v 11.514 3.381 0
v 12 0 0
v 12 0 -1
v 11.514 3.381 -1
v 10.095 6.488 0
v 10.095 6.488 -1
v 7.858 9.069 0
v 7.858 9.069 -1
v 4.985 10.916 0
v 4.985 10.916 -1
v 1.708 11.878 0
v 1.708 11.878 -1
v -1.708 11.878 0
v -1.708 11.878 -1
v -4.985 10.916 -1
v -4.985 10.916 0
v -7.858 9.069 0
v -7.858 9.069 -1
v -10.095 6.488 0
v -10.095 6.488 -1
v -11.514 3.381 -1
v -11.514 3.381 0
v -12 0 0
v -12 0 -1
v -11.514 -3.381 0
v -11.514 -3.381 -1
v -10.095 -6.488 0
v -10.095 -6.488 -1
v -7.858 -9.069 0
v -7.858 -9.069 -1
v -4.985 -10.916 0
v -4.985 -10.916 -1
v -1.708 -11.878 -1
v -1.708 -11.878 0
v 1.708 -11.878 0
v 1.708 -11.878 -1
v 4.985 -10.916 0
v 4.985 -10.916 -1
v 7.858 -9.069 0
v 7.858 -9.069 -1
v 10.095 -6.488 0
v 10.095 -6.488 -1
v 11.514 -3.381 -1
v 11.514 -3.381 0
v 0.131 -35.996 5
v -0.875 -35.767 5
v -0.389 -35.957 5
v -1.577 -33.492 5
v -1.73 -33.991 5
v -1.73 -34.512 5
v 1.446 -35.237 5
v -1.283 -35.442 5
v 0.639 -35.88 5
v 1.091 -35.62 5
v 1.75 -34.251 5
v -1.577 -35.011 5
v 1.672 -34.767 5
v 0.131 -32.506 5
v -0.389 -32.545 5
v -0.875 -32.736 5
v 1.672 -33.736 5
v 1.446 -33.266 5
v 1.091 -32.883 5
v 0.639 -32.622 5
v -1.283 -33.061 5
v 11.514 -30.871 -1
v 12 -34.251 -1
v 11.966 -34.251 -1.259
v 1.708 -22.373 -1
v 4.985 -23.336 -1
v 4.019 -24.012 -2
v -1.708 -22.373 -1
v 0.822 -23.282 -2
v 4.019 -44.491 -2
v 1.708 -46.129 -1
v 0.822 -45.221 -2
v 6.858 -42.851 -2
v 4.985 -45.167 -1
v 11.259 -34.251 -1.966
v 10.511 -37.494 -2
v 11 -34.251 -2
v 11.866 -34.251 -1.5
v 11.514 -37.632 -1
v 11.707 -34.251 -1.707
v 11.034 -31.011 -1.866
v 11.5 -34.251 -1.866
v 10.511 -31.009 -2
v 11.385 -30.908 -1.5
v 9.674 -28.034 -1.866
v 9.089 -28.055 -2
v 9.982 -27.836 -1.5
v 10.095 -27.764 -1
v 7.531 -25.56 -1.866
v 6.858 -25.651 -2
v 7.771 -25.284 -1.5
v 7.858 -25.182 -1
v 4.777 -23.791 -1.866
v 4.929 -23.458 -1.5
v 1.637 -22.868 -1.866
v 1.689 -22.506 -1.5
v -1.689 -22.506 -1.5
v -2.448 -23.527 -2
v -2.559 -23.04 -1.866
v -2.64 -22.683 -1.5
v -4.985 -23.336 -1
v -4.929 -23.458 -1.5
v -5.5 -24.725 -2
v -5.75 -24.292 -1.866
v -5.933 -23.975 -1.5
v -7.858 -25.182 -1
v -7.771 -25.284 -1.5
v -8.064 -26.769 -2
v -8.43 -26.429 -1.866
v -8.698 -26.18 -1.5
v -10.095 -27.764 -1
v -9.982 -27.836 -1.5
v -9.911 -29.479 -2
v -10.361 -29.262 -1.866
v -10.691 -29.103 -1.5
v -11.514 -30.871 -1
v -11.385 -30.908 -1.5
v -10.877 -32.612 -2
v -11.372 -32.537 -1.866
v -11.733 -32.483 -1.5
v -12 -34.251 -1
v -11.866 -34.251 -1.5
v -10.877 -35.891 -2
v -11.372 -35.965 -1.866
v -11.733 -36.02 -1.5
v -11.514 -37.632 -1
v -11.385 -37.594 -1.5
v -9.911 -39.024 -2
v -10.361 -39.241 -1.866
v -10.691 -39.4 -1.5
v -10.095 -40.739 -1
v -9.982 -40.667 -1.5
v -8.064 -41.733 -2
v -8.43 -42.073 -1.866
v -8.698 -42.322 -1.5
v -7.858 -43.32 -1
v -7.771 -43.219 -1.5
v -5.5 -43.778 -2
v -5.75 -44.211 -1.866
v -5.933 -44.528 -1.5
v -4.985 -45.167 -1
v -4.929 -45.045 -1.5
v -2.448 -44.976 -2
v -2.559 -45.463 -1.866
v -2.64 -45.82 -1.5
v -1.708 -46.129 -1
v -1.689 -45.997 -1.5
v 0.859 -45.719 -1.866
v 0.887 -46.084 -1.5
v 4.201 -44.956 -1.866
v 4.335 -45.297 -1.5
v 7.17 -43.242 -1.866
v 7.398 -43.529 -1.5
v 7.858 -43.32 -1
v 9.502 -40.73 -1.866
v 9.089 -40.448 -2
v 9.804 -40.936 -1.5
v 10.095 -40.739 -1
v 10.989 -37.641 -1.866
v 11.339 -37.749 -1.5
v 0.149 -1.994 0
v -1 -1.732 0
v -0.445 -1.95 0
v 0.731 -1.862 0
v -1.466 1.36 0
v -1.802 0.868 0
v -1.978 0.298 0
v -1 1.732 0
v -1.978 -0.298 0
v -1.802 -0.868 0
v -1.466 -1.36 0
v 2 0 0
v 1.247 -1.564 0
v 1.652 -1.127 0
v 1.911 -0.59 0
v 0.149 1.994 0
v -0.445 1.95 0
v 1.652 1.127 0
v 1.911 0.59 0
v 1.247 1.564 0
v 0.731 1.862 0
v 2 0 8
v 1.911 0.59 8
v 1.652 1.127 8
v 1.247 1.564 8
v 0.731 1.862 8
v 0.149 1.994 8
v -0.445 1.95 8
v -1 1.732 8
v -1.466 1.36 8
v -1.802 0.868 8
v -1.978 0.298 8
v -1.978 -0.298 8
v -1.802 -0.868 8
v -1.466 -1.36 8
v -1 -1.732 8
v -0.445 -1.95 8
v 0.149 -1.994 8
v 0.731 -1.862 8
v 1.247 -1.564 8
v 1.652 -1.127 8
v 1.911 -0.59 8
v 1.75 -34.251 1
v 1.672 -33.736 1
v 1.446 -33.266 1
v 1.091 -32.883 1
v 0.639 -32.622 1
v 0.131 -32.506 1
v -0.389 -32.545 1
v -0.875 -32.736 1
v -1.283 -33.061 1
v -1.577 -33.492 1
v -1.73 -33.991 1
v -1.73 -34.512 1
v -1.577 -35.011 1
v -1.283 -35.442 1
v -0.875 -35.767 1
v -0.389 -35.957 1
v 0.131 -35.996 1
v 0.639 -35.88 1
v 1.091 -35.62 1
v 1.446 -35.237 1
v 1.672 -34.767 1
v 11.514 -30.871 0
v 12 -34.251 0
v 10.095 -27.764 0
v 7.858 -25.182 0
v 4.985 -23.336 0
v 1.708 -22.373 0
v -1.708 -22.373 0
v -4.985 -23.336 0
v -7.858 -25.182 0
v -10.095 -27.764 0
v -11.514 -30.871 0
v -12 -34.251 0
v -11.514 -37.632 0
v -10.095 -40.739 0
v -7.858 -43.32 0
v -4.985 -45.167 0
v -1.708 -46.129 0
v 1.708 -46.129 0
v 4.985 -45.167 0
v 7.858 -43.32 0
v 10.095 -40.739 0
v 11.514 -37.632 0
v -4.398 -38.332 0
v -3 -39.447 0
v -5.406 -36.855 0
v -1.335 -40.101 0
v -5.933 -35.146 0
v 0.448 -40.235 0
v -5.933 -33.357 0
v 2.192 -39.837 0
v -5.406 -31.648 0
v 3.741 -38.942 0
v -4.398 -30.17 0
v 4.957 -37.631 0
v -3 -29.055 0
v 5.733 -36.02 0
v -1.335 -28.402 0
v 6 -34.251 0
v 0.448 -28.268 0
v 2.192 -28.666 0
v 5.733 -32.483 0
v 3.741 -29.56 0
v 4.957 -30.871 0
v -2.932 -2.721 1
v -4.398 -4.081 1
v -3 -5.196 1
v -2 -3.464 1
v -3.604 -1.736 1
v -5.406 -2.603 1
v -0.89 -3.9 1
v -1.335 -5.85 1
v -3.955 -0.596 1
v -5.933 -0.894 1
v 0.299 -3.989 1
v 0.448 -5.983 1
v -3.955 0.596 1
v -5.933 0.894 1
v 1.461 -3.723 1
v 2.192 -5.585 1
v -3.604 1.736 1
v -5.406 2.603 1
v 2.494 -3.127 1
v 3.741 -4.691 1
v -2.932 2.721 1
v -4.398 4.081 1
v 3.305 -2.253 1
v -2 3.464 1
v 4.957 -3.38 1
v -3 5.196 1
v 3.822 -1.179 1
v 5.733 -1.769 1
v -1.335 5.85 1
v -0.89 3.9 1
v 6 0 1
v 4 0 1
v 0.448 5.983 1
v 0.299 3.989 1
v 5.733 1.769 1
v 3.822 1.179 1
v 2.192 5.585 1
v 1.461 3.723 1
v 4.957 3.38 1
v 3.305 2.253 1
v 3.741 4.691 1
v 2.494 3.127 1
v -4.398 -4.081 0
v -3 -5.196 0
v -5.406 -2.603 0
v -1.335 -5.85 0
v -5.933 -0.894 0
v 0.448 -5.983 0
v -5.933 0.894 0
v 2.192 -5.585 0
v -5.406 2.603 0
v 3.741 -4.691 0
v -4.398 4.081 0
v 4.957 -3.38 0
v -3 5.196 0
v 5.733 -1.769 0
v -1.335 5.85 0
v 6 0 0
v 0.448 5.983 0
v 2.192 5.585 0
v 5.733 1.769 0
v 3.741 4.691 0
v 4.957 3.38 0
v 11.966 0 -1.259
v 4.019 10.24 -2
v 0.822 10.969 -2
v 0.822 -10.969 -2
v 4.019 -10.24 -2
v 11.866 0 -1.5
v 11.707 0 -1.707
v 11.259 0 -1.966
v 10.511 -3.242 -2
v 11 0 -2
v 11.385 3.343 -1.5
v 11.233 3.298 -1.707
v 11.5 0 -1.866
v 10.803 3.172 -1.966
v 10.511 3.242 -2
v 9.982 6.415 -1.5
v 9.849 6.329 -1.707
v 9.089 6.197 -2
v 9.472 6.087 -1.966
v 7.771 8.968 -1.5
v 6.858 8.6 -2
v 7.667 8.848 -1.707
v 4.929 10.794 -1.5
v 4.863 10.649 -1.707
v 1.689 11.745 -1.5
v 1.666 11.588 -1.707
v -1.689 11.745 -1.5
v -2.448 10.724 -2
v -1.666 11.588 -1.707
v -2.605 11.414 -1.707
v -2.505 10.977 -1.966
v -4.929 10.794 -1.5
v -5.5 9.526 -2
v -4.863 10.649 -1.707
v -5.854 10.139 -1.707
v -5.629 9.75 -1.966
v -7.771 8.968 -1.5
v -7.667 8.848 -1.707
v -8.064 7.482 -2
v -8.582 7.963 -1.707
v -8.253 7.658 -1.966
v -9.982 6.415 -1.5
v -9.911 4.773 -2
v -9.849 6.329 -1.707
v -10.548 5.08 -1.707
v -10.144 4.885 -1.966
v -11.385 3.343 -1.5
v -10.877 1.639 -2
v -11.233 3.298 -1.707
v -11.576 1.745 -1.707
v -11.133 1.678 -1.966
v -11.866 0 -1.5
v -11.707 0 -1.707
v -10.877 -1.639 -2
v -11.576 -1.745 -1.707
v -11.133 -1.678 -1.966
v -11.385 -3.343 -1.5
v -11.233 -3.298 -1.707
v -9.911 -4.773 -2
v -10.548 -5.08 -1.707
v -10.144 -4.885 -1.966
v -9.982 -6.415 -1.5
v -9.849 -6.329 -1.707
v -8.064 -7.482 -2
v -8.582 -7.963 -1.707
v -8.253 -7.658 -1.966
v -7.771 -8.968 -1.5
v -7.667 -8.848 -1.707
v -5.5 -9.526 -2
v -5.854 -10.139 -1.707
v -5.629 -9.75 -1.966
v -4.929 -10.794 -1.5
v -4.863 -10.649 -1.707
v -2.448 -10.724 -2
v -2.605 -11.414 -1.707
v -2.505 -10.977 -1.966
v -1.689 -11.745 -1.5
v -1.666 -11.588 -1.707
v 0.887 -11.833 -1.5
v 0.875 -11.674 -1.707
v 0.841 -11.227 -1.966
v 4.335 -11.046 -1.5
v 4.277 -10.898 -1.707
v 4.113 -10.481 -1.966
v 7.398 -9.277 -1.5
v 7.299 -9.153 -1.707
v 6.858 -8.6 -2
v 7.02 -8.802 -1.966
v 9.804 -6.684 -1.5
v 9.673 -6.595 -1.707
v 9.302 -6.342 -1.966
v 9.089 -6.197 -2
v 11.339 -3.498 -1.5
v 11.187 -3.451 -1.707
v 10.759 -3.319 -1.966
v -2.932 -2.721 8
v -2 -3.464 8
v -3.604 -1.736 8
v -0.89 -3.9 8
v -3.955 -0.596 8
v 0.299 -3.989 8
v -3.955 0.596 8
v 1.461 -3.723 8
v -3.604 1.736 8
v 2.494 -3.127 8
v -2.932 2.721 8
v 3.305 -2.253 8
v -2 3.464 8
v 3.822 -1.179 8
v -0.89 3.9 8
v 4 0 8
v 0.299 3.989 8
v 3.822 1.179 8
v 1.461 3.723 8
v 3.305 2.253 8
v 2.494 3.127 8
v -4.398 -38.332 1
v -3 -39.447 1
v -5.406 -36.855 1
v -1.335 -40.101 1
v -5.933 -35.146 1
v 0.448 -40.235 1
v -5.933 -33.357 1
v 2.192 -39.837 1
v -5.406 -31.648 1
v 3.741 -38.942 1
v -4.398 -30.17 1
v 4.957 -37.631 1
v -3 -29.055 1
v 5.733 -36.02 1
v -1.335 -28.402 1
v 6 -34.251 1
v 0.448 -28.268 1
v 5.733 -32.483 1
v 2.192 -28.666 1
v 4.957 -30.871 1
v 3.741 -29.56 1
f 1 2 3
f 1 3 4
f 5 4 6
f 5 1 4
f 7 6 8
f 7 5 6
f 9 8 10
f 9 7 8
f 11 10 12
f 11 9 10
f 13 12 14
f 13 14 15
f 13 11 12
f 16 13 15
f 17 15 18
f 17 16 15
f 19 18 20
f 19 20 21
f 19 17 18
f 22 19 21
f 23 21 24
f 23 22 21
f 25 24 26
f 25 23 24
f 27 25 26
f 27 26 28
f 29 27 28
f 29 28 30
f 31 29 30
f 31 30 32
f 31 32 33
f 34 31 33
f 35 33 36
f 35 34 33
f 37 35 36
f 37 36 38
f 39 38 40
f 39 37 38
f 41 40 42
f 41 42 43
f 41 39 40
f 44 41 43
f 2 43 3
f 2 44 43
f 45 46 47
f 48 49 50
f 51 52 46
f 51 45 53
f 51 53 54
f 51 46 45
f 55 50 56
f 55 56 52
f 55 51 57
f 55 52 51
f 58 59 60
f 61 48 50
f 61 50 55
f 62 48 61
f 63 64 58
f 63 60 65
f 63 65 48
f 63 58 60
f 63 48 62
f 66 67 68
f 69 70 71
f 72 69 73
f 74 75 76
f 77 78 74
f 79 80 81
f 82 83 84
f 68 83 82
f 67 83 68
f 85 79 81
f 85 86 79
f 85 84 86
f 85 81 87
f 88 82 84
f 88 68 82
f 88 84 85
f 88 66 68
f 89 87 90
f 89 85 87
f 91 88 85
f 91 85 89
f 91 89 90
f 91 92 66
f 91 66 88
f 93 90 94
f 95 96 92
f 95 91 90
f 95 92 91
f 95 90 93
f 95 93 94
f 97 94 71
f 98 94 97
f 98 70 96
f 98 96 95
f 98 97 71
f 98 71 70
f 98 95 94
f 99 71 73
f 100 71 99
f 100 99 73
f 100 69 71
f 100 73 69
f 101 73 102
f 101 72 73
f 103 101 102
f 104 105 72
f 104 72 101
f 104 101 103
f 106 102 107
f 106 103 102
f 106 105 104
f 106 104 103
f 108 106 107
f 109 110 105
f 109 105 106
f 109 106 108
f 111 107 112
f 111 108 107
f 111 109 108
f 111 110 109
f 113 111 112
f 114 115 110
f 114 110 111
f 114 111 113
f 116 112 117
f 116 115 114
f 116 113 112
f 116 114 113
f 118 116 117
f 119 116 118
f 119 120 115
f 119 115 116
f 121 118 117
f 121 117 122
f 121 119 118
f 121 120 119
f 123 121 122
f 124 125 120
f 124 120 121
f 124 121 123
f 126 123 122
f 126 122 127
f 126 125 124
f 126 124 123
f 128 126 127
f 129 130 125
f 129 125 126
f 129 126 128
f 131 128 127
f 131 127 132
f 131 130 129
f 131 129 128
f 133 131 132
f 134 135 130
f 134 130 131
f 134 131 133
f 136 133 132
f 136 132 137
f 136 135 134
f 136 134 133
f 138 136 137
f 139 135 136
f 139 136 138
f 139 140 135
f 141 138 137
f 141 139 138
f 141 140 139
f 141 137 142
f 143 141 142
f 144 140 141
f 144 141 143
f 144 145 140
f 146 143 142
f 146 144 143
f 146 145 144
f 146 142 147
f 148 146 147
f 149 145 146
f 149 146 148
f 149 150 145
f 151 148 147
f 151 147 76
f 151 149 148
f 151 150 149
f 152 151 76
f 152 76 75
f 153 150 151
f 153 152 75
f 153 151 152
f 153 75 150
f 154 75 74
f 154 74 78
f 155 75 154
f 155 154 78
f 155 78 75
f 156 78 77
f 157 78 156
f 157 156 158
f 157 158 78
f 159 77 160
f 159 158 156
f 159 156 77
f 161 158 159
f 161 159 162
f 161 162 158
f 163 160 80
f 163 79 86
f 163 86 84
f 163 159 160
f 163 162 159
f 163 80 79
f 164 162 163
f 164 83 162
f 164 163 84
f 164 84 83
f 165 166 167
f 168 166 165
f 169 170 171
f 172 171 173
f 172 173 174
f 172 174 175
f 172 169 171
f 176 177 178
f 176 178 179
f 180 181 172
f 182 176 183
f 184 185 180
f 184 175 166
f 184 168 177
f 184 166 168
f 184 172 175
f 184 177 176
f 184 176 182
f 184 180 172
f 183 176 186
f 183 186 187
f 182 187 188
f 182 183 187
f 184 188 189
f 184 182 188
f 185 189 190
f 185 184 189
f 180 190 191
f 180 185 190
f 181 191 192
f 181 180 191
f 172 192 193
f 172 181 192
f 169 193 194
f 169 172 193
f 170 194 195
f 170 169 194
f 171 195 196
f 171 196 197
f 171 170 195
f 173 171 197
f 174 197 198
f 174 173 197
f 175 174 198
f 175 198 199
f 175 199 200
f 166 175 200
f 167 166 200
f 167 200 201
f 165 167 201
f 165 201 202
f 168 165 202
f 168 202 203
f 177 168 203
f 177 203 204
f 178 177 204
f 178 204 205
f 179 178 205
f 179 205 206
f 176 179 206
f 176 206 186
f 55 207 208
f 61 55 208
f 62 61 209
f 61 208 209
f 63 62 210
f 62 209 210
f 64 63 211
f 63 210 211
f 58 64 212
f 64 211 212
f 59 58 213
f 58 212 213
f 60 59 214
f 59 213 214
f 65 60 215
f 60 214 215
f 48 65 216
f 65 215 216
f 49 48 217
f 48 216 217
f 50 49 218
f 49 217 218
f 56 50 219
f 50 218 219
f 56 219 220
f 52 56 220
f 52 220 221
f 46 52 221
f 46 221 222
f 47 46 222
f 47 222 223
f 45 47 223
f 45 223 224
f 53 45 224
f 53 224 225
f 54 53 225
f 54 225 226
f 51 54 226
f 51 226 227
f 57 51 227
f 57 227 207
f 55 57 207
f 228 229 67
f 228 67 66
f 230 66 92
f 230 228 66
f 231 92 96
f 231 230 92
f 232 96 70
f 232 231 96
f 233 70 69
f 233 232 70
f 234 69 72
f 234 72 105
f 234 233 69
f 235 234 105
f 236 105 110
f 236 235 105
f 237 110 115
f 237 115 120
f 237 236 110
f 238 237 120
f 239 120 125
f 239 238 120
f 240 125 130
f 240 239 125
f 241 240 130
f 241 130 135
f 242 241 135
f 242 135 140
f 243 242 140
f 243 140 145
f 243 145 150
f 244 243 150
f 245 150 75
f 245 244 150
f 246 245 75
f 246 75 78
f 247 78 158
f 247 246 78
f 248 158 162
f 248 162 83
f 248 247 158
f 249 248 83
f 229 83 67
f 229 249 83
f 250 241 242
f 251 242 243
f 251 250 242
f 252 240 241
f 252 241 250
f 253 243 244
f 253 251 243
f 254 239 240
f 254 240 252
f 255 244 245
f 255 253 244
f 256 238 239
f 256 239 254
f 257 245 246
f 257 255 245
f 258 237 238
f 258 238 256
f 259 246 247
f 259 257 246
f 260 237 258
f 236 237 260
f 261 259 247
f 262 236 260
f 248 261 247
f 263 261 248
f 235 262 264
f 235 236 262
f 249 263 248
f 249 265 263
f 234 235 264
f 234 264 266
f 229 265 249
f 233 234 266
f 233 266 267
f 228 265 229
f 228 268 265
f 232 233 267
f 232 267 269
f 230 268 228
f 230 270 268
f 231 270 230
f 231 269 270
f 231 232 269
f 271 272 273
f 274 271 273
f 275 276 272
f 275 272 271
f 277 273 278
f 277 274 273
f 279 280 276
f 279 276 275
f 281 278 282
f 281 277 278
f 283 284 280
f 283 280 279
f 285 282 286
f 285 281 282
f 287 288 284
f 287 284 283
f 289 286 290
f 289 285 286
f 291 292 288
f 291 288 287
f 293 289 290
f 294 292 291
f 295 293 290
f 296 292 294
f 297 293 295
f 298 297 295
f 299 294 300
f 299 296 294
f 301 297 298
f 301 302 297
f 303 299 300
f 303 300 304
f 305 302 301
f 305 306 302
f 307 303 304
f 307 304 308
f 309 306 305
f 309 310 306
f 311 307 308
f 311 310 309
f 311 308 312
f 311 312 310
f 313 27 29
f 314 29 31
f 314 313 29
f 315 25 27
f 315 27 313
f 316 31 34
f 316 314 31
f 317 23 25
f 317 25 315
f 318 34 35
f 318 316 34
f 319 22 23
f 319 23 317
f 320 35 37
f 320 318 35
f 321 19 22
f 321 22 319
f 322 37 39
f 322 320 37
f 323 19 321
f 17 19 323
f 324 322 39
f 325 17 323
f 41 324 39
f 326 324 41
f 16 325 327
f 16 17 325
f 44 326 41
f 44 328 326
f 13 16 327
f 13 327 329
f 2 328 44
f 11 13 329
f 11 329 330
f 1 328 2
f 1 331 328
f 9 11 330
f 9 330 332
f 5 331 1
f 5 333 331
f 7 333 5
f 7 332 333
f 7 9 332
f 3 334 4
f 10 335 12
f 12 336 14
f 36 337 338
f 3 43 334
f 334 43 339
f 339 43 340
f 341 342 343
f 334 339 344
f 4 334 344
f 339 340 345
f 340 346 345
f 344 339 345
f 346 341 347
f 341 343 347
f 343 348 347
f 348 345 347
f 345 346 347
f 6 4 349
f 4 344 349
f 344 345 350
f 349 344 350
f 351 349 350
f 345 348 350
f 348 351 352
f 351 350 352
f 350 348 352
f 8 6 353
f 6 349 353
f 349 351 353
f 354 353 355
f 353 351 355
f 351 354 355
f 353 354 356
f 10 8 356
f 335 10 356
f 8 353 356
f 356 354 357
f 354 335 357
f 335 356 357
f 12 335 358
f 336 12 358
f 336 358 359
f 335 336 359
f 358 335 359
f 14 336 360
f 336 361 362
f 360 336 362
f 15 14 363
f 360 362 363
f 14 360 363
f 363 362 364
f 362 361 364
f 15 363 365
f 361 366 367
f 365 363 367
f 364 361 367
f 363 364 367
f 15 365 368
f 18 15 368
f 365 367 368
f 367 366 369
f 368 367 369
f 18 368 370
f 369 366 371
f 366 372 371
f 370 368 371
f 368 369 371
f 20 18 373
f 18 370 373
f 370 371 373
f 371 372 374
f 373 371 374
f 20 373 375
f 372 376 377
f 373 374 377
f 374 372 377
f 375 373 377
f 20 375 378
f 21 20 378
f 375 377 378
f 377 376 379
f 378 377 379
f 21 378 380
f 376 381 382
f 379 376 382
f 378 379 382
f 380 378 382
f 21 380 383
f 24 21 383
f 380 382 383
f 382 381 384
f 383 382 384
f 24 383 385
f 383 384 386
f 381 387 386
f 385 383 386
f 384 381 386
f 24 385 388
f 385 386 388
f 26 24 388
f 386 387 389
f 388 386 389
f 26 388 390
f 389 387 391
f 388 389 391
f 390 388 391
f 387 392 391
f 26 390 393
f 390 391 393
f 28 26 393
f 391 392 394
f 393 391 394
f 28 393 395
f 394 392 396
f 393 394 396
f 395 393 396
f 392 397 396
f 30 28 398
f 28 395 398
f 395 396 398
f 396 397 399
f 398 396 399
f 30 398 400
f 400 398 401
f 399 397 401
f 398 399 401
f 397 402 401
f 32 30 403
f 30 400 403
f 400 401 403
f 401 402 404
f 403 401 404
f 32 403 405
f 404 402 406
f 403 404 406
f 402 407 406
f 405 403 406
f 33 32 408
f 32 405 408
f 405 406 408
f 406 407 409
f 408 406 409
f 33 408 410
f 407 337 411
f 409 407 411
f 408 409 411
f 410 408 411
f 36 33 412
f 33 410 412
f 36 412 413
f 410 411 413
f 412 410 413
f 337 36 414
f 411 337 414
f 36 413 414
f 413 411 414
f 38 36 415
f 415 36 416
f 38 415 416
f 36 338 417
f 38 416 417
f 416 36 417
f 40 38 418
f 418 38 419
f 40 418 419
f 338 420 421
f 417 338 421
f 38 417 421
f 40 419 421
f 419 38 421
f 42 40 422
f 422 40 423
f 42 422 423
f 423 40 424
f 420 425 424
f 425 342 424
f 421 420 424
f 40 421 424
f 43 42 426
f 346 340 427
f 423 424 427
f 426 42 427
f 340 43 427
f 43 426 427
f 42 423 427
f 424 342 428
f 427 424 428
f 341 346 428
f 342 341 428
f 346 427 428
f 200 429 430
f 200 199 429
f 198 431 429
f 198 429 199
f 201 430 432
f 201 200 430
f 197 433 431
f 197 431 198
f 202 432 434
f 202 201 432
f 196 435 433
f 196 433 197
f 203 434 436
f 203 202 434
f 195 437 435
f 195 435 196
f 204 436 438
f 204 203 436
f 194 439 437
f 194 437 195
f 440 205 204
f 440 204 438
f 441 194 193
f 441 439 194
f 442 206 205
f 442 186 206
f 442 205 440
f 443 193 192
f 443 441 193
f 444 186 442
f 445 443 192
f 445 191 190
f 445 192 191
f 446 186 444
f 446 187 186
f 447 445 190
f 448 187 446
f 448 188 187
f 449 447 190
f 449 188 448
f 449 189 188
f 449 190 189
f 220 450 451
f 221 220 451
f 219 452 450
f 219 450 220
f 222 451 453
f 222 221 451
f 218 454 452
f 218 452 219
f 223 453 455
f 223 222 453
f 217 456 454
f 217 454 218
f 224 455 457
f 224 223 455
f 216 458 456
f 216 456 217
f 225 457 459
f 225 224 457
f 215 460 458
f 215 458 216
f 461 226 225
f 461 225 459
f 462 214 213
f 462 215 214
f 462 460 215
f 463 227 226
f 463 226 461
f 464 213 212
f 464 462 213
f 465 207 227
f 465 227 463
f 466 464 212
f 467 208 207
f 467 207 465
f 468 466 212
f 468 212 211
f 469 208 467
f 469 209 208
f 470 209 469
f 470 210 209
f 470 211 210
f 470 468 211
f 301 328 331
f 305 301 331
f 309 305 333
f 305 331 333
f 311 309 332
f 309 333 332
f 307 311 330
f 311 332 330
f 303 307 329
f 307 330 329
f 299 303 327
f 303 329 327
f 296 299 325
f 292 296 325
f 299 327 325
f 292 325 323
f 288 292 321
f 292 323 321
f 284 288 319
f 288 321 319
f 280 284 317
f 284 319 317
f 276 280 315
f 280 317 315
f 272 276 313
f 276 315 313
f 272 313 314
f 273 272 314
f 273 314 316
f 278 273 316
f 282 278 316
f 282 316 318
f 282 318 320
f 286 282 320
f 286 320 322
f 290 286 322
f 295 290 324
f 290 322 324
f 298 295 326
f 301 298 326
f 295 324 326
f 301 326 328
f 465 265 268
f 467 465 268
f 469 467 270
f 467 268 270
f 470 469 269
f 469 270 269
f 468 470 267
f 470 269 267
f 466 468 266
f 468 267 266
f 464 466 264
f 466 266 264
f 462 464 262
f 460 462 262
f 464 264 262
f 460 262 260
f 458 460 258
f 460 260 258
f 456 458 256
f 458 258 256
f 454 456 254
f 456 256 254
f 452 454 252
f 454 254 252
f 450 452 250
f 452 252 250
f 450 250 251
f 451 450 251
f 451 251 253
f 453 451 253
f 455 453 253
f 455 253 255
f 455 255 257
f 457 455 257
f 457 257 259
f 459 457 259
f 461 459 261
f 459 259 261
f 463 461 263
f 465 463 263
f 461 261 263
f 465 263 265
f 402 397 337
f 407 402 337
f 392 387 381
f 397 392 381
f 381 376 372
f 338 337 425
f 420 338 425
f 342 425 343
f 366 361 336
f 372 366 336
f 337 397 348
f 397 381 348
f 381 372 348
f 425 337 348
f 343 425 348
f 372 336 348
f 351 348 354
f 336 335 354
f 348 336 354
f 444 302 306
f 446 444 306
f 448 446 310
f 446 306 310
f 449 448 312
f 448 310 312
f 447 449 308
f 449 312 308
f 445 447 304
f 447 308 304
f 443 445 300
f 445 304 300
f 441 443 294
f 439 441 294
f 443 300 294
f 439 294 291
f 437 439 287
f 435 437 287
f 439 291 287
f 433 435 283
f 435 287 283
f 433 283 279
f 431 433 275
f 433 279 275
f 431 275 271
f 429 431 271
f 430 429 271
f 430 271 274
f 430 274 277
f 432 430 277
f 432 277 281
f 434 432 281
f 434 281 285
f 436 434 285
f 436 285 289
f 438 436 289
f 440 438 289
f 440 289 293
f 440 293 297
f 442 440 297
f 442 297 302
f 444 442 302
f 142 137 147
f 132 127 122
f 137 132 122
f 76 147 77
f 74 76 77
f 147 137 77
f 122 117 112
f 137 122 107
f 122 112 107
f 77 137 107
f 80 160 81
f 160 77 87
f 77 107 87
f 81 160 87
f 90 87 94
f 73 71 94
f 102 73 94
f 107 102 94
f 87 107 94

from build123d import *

# Parameters (mm, degrees)
F0_R          = 12
F0_R_2        = 6
F0_R_3        = 4
F0_R_4        = 2
F1_DEPTH      = 2
F2_DEPTH      = 1
F3_DEPTH      = 8
F4_R          = 1
F5_DEPTH      = 2
F0_R_5        = 1.75
F6_DEPTH      = 1
F6_DEPTH_BACK = 2
F7_DEPTH      = 5
F7_DEPTH_BACK = 2
F8_DEPTH      = 2
F9_R          = 1


with BuildPart() as f1:
    # F0 (on Top) → F1 (new body)
    with BuildSketch(Plane.XY):
        Circle(F0_R)
        Circle(F0_R_2, mode=Mode.SUBTRACT)
        Circle(F0_R_2)
        Circle(F0_R_3, mode=Mode.SUBTRACT)
        Circle(F0_R_3)
        Circle(F0_R_4, mode=Mode.SUBTRACT)
    extrude(amount=-F1_DEPTH)

    # F0 (on Top) → F2 (join)
    with BuildSketch(Plane.XY):
        Circle(F0_R_2)
        Circle(F0_R_3, mode=Mode.SUBTRACT)
        Circle(F0_R_3)
        Circle(F0_R_4, mode=Mode.SUBTRACT)
    extrude(amount=F2_DEPTH)

    # F0 (on Top) → F3 (join)
    with BuildSketch(Plane.XY):
        Circle(F0_R_3)
        Circle(F0_R_4, mode=Mode.SUBTRACT)
    extrude(amount=F3_DEPTH)

    # F4
    f4_edges = [f1.edges().sort_by_distance(p)[0] for p in [
        (-12, 0, -2),
    ]]
    fillet(f4_edges, radius=F4_R)

    # F0 (on Top) → F8 (join)
    with BuildSketch(Plane.XY):
        Circle(F0_R_4)
    extrude(amount=-F8_DEPTH)


with BuildPart() as f5:
    # F0 (on Top) → F5 (new body)
    with BuildSketch(Plane.XY):
        with Locations((0, -34.25134)):
            Circle(F0_R)
        with Locations((0, -34.25134)):
            Circle(F0_R_2, mode=Mode.SUBTRACT)
    extrude(amount=-F5_DEPTH)

    # F0 (on Top) → F6 (join, two sides)
    with BuildSketch(Plane.XY) as f6_sk:
        with Locations((0, -34.25134)):
            Circle(F0_R_2)
        with Locations((0, -34.25134)):
            Circle(F0_R_5, mode=Mode.SUBTRACT)
    extrude(amount=F6_DEPTH)
    extrude(f6_sk.sketch, amount=-F6_DEPTH_BACK)

    # F0 (on Top) → F7 (join, two sides)
    with BuildSketch(Plane.XY) as f7_sk:
        with Locations((0, -34.25134)):
            Circle(F0_R_5)
    extrude(amount=F7_DEPTH)
    extrude(f7_sk.sketch, amount=-F7_DEPTH_BACK)

    # F9
    f9_edges = [f5.edges().sort_by_distance(p)[0] for p in [
        (-12, -34.25134, -2),
    ]]
    fillet(f9_edges, radius=F9_R)


solid = Compound([f1.part, f5.part])
